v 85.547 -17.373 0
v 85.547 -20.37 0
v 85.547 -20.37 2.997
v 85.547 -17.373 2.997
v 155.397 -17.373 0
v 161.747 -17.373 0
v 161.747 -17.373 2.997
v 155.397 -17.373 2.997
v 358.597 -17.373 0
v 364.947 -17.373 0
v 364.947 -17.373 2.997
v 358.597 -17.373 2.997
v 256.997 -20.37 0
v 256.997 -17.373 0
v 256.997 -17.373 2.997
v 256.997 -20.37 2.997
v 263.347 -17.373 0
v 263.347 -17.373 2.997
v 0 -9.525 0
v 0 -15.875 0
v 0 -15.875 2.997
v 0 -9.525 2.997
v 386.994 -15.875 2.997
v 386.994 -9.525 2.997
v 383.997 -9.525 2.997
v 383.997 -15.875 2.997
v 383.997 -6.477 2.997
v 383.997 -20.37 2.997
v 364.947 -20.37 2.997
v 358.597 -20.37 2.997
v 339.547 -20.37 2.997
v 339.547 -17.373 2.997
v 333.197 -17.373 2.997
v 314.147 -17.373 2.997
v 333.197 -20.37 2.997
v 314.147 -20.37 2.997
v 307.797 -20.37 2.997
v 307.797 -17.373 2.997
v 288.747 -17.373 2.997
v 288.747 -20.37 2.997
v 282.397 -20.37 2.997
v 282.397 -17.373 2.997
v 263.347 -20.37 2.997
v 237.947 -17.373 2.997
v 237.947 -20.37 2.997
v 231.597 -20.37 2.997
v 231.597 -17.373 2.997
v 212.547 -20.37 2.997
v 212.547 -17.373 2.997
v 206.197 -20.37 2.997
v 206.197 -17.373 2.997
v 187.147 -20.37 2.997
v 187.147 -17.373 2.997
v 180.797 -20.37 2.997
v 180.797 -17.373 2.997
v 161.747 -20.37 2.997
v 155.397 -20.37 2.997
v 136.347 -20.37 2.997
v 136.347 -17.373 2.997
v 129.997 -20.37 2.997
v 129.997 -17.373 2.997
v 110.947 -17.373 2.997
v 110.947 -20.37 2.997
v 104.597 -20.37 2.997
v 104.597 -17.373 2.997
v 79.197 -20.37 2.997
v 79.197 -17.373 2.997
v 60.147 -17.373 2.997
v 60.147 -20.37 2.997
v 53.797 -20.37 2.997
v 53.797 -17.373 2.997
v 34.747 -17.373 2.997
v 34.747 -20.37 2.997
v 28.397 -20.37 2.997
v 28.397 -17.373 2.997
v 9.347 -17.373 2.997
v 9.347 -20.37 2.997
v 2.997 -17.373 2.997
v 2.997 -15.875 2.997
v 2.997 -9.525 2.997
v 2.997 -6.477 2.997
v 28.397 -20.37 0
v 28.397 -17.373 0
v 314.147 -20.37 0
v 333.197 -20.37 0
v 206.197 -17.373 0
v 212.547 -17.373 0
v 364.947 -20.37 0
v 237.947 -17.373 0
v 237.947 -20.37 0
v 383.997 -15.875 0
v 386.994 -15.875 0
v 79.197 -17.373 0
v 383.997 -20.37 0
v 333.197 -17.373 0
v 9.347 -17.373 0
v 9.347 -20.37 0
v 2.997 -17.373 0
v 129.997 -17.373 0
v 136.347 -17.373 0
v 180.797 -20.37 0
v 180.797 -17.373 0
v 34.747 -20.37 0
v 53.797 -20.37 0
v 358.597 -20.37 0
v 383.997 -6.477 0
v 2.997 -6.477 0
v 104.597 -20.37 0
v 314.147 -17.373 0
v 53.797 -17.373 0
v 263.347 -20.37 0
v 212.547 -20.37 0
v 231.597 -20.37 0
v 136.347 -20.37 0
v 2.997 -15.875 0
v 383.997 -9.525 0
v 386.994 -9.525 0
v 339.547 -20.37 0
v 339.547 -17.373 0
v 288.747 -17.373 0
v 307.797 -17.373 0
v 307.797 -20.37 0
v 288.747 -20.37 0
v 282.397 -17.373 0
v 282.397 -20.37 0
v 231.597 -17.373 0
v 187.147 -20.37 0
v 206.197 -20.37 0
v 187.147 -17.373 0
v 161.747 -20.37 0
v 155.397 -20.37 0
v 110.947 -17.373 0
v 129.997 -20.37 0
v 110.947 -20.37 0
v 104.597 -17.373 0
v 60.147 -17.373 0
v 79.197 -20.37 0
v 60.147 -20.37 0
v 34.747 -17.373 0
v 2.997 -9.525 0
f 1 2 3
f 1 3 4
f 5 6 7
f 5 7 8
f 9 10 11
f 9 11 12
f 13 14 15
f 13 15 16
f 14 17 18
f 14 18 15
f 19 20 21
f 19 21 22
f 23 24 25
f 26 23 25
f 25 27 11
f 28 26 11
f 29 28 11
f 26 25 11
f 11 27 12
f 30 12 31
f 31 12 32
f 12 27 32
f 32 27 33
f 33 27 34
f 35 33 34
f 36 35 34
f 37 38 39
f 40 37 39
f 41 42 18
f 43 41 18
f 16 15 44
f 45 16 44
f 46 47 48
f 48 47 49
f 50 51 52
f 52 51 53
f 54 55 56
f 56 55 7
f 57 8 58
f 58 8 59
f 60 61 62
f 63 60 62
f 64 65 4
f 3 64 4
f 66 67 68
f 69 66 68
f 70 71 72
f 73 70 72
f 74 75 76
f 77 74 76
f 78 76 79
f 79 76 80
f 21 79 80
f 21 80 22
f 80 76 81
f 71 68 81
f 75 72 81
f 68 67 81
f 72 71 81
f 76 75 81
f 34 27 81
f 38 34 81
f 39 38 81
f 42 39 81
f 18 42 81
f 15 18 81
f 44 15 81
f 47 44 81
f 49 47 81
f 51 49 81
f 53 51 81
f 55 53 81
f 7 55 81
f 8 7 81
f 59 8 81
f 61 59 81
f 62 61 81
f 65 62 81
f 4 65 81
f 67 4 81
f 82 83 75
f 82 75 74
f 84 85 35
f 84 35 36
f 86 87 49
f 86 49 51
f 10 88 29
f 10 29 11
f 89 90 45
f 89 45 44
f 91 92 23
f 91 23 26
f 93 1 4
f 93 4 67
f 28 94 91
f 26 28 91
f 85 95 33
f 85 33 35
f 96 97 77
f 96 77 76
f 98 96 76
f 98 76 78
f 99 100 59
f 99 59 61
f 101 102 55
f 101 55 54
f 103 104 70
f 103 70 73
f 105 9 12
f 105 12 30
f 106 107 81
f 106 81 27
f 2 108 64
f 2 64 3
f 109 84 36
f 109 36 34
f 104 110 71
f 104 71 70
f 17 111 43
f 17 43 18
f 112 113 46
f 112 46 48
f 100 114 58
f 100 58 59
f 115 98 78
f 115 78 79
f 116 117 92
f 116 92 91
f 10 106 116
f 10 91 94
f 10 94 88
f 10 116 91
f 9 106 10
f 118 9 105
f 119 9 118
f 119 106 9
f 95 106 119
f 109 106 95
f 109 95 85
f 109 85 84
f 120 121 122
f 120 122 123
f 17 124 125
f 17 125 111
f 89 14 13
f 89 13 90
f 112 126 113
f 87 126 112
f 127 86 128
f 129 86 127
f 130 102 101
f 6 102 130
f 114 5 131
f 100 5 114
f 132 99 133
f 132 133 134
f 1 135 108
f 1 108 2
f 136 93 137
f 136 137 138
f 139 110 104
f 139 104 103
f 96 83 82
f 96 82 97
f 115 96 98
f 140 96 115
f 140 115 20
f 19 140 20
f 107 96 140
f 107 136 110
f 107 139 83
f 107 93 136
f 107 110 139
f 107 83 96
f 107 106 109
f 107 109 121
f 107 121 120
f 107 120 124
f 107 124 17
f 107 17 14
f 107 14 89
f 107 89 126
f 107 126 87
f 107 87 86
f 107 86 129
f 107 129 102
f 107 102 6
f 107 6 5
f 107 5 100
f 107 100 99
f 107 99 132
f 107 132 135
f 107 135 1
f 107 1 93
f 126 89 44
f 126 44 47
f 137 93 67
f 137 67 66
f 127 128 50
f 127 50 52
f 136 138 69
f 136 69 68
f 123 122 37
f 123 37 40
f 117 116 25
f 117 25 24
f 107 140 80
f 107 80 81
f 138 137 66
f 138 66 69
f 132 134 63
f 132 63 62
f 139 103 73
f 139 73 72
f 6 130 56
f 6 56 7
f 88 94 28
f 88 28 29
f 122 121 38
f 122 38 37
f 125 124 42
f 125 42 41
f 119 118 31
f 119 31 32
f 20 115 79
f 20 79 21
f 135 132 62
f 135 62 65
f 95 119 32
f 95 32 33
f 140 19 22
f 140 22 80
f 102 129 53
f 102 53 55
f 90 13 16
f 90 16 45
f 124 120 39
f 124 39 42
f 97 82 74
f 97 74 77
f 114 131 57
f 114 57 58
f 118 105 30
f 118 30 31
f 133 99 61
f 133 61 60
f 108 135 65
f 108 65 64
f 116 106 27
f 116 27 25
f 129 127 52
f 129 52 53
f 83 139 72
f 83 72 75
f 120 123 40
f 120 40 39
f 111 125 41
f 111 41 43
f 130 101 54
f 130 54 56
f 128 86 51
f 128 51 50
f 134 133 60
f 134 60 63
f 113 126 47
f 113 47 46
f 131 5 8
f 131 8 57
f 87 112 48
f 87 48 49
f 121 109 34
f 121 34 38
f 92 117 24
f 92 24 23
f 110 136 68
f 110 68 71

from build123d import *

# Parameters (mm, degrees)
BOSS_EXTRUDE1_DEPTH = 2.9972


with BuildPart() as part:
    # Sketch1 → Boss-Extrude1 (new body)
    with BuildSketch(Plane.XY):
        Polygon((2.9972, -15.875), (0, -15.875), (0, -9.525), (2.9972, -9.525), (2.9972, -6.477), (383.9972, -6.477), (383.9972, -9.525), (386.9944, -9.525), (386.9944, -15.875), (383.9972, -15.875), (383.9972, -17.3728), (383.9972, -20.37), (364.9472, -20.37), (364.9472, -17.3728), (358.5972, -17.3728), (358.5972, -20.37), (339.5472, -20.37), (339.5472, -17.3728), (333.1972, -17.3728), (333.1972, -20.37), (314.1472, -20.37), (314.1472, -17.3728), (307.7972, -17.3728), (307.7972, -20.37), (288.7472, -20.37), (288.7472, -17.3728), (282.3972, -17.3728), (282.3972, -20.37), (263.3472, -20.37), (263.3472, -17.3728), (256.9972, -17.3728), (256.9972, -20.37), (237.9472, -20.37), (237.9472, -17.3728), (231.5972, -17.3728), (231.5972, -20.37), (212.5472, -20.37), (212.5472, -17.3728), (206.1972, -17.3728), (206.1972, -20.37), (187.1472, -20.37), (187.1472, -17.3728), (180.7972, -17.3728), (180.7972, -20.37), (161.7472, -20.37), (161.7472, -17.3728), (155.3972, -17.3728), (155.3972, -20.37), (136.3472, -20.37), (136.3472, -17.3728), (129.9972, -17.3728), (129.9972, -20.37), (110.9472, -20.37), (110.9472, -17.3728), (104.5972, -17.3728), (104.5972, -20.37), (85.5472, -20.37), (85.5472, -17.3728), (79.1972, -17.3728), (79.1972, -20.37), (60.1472, -20.37), (60.1472, -17.3728), (53.7972, -17.3728), (53.7972, -20.37), (34.7472, -20.37), (34.7472, -17.3728), (28.3972, -17.3728), (28.3972, -20.37), (9.3472, -20.37), (9.3472, -17.3728), (2.9972, -17.3728), align=None)
    extrude(amount=BOSS_EXTRUDE1_DEPTH)


solid = part.part
